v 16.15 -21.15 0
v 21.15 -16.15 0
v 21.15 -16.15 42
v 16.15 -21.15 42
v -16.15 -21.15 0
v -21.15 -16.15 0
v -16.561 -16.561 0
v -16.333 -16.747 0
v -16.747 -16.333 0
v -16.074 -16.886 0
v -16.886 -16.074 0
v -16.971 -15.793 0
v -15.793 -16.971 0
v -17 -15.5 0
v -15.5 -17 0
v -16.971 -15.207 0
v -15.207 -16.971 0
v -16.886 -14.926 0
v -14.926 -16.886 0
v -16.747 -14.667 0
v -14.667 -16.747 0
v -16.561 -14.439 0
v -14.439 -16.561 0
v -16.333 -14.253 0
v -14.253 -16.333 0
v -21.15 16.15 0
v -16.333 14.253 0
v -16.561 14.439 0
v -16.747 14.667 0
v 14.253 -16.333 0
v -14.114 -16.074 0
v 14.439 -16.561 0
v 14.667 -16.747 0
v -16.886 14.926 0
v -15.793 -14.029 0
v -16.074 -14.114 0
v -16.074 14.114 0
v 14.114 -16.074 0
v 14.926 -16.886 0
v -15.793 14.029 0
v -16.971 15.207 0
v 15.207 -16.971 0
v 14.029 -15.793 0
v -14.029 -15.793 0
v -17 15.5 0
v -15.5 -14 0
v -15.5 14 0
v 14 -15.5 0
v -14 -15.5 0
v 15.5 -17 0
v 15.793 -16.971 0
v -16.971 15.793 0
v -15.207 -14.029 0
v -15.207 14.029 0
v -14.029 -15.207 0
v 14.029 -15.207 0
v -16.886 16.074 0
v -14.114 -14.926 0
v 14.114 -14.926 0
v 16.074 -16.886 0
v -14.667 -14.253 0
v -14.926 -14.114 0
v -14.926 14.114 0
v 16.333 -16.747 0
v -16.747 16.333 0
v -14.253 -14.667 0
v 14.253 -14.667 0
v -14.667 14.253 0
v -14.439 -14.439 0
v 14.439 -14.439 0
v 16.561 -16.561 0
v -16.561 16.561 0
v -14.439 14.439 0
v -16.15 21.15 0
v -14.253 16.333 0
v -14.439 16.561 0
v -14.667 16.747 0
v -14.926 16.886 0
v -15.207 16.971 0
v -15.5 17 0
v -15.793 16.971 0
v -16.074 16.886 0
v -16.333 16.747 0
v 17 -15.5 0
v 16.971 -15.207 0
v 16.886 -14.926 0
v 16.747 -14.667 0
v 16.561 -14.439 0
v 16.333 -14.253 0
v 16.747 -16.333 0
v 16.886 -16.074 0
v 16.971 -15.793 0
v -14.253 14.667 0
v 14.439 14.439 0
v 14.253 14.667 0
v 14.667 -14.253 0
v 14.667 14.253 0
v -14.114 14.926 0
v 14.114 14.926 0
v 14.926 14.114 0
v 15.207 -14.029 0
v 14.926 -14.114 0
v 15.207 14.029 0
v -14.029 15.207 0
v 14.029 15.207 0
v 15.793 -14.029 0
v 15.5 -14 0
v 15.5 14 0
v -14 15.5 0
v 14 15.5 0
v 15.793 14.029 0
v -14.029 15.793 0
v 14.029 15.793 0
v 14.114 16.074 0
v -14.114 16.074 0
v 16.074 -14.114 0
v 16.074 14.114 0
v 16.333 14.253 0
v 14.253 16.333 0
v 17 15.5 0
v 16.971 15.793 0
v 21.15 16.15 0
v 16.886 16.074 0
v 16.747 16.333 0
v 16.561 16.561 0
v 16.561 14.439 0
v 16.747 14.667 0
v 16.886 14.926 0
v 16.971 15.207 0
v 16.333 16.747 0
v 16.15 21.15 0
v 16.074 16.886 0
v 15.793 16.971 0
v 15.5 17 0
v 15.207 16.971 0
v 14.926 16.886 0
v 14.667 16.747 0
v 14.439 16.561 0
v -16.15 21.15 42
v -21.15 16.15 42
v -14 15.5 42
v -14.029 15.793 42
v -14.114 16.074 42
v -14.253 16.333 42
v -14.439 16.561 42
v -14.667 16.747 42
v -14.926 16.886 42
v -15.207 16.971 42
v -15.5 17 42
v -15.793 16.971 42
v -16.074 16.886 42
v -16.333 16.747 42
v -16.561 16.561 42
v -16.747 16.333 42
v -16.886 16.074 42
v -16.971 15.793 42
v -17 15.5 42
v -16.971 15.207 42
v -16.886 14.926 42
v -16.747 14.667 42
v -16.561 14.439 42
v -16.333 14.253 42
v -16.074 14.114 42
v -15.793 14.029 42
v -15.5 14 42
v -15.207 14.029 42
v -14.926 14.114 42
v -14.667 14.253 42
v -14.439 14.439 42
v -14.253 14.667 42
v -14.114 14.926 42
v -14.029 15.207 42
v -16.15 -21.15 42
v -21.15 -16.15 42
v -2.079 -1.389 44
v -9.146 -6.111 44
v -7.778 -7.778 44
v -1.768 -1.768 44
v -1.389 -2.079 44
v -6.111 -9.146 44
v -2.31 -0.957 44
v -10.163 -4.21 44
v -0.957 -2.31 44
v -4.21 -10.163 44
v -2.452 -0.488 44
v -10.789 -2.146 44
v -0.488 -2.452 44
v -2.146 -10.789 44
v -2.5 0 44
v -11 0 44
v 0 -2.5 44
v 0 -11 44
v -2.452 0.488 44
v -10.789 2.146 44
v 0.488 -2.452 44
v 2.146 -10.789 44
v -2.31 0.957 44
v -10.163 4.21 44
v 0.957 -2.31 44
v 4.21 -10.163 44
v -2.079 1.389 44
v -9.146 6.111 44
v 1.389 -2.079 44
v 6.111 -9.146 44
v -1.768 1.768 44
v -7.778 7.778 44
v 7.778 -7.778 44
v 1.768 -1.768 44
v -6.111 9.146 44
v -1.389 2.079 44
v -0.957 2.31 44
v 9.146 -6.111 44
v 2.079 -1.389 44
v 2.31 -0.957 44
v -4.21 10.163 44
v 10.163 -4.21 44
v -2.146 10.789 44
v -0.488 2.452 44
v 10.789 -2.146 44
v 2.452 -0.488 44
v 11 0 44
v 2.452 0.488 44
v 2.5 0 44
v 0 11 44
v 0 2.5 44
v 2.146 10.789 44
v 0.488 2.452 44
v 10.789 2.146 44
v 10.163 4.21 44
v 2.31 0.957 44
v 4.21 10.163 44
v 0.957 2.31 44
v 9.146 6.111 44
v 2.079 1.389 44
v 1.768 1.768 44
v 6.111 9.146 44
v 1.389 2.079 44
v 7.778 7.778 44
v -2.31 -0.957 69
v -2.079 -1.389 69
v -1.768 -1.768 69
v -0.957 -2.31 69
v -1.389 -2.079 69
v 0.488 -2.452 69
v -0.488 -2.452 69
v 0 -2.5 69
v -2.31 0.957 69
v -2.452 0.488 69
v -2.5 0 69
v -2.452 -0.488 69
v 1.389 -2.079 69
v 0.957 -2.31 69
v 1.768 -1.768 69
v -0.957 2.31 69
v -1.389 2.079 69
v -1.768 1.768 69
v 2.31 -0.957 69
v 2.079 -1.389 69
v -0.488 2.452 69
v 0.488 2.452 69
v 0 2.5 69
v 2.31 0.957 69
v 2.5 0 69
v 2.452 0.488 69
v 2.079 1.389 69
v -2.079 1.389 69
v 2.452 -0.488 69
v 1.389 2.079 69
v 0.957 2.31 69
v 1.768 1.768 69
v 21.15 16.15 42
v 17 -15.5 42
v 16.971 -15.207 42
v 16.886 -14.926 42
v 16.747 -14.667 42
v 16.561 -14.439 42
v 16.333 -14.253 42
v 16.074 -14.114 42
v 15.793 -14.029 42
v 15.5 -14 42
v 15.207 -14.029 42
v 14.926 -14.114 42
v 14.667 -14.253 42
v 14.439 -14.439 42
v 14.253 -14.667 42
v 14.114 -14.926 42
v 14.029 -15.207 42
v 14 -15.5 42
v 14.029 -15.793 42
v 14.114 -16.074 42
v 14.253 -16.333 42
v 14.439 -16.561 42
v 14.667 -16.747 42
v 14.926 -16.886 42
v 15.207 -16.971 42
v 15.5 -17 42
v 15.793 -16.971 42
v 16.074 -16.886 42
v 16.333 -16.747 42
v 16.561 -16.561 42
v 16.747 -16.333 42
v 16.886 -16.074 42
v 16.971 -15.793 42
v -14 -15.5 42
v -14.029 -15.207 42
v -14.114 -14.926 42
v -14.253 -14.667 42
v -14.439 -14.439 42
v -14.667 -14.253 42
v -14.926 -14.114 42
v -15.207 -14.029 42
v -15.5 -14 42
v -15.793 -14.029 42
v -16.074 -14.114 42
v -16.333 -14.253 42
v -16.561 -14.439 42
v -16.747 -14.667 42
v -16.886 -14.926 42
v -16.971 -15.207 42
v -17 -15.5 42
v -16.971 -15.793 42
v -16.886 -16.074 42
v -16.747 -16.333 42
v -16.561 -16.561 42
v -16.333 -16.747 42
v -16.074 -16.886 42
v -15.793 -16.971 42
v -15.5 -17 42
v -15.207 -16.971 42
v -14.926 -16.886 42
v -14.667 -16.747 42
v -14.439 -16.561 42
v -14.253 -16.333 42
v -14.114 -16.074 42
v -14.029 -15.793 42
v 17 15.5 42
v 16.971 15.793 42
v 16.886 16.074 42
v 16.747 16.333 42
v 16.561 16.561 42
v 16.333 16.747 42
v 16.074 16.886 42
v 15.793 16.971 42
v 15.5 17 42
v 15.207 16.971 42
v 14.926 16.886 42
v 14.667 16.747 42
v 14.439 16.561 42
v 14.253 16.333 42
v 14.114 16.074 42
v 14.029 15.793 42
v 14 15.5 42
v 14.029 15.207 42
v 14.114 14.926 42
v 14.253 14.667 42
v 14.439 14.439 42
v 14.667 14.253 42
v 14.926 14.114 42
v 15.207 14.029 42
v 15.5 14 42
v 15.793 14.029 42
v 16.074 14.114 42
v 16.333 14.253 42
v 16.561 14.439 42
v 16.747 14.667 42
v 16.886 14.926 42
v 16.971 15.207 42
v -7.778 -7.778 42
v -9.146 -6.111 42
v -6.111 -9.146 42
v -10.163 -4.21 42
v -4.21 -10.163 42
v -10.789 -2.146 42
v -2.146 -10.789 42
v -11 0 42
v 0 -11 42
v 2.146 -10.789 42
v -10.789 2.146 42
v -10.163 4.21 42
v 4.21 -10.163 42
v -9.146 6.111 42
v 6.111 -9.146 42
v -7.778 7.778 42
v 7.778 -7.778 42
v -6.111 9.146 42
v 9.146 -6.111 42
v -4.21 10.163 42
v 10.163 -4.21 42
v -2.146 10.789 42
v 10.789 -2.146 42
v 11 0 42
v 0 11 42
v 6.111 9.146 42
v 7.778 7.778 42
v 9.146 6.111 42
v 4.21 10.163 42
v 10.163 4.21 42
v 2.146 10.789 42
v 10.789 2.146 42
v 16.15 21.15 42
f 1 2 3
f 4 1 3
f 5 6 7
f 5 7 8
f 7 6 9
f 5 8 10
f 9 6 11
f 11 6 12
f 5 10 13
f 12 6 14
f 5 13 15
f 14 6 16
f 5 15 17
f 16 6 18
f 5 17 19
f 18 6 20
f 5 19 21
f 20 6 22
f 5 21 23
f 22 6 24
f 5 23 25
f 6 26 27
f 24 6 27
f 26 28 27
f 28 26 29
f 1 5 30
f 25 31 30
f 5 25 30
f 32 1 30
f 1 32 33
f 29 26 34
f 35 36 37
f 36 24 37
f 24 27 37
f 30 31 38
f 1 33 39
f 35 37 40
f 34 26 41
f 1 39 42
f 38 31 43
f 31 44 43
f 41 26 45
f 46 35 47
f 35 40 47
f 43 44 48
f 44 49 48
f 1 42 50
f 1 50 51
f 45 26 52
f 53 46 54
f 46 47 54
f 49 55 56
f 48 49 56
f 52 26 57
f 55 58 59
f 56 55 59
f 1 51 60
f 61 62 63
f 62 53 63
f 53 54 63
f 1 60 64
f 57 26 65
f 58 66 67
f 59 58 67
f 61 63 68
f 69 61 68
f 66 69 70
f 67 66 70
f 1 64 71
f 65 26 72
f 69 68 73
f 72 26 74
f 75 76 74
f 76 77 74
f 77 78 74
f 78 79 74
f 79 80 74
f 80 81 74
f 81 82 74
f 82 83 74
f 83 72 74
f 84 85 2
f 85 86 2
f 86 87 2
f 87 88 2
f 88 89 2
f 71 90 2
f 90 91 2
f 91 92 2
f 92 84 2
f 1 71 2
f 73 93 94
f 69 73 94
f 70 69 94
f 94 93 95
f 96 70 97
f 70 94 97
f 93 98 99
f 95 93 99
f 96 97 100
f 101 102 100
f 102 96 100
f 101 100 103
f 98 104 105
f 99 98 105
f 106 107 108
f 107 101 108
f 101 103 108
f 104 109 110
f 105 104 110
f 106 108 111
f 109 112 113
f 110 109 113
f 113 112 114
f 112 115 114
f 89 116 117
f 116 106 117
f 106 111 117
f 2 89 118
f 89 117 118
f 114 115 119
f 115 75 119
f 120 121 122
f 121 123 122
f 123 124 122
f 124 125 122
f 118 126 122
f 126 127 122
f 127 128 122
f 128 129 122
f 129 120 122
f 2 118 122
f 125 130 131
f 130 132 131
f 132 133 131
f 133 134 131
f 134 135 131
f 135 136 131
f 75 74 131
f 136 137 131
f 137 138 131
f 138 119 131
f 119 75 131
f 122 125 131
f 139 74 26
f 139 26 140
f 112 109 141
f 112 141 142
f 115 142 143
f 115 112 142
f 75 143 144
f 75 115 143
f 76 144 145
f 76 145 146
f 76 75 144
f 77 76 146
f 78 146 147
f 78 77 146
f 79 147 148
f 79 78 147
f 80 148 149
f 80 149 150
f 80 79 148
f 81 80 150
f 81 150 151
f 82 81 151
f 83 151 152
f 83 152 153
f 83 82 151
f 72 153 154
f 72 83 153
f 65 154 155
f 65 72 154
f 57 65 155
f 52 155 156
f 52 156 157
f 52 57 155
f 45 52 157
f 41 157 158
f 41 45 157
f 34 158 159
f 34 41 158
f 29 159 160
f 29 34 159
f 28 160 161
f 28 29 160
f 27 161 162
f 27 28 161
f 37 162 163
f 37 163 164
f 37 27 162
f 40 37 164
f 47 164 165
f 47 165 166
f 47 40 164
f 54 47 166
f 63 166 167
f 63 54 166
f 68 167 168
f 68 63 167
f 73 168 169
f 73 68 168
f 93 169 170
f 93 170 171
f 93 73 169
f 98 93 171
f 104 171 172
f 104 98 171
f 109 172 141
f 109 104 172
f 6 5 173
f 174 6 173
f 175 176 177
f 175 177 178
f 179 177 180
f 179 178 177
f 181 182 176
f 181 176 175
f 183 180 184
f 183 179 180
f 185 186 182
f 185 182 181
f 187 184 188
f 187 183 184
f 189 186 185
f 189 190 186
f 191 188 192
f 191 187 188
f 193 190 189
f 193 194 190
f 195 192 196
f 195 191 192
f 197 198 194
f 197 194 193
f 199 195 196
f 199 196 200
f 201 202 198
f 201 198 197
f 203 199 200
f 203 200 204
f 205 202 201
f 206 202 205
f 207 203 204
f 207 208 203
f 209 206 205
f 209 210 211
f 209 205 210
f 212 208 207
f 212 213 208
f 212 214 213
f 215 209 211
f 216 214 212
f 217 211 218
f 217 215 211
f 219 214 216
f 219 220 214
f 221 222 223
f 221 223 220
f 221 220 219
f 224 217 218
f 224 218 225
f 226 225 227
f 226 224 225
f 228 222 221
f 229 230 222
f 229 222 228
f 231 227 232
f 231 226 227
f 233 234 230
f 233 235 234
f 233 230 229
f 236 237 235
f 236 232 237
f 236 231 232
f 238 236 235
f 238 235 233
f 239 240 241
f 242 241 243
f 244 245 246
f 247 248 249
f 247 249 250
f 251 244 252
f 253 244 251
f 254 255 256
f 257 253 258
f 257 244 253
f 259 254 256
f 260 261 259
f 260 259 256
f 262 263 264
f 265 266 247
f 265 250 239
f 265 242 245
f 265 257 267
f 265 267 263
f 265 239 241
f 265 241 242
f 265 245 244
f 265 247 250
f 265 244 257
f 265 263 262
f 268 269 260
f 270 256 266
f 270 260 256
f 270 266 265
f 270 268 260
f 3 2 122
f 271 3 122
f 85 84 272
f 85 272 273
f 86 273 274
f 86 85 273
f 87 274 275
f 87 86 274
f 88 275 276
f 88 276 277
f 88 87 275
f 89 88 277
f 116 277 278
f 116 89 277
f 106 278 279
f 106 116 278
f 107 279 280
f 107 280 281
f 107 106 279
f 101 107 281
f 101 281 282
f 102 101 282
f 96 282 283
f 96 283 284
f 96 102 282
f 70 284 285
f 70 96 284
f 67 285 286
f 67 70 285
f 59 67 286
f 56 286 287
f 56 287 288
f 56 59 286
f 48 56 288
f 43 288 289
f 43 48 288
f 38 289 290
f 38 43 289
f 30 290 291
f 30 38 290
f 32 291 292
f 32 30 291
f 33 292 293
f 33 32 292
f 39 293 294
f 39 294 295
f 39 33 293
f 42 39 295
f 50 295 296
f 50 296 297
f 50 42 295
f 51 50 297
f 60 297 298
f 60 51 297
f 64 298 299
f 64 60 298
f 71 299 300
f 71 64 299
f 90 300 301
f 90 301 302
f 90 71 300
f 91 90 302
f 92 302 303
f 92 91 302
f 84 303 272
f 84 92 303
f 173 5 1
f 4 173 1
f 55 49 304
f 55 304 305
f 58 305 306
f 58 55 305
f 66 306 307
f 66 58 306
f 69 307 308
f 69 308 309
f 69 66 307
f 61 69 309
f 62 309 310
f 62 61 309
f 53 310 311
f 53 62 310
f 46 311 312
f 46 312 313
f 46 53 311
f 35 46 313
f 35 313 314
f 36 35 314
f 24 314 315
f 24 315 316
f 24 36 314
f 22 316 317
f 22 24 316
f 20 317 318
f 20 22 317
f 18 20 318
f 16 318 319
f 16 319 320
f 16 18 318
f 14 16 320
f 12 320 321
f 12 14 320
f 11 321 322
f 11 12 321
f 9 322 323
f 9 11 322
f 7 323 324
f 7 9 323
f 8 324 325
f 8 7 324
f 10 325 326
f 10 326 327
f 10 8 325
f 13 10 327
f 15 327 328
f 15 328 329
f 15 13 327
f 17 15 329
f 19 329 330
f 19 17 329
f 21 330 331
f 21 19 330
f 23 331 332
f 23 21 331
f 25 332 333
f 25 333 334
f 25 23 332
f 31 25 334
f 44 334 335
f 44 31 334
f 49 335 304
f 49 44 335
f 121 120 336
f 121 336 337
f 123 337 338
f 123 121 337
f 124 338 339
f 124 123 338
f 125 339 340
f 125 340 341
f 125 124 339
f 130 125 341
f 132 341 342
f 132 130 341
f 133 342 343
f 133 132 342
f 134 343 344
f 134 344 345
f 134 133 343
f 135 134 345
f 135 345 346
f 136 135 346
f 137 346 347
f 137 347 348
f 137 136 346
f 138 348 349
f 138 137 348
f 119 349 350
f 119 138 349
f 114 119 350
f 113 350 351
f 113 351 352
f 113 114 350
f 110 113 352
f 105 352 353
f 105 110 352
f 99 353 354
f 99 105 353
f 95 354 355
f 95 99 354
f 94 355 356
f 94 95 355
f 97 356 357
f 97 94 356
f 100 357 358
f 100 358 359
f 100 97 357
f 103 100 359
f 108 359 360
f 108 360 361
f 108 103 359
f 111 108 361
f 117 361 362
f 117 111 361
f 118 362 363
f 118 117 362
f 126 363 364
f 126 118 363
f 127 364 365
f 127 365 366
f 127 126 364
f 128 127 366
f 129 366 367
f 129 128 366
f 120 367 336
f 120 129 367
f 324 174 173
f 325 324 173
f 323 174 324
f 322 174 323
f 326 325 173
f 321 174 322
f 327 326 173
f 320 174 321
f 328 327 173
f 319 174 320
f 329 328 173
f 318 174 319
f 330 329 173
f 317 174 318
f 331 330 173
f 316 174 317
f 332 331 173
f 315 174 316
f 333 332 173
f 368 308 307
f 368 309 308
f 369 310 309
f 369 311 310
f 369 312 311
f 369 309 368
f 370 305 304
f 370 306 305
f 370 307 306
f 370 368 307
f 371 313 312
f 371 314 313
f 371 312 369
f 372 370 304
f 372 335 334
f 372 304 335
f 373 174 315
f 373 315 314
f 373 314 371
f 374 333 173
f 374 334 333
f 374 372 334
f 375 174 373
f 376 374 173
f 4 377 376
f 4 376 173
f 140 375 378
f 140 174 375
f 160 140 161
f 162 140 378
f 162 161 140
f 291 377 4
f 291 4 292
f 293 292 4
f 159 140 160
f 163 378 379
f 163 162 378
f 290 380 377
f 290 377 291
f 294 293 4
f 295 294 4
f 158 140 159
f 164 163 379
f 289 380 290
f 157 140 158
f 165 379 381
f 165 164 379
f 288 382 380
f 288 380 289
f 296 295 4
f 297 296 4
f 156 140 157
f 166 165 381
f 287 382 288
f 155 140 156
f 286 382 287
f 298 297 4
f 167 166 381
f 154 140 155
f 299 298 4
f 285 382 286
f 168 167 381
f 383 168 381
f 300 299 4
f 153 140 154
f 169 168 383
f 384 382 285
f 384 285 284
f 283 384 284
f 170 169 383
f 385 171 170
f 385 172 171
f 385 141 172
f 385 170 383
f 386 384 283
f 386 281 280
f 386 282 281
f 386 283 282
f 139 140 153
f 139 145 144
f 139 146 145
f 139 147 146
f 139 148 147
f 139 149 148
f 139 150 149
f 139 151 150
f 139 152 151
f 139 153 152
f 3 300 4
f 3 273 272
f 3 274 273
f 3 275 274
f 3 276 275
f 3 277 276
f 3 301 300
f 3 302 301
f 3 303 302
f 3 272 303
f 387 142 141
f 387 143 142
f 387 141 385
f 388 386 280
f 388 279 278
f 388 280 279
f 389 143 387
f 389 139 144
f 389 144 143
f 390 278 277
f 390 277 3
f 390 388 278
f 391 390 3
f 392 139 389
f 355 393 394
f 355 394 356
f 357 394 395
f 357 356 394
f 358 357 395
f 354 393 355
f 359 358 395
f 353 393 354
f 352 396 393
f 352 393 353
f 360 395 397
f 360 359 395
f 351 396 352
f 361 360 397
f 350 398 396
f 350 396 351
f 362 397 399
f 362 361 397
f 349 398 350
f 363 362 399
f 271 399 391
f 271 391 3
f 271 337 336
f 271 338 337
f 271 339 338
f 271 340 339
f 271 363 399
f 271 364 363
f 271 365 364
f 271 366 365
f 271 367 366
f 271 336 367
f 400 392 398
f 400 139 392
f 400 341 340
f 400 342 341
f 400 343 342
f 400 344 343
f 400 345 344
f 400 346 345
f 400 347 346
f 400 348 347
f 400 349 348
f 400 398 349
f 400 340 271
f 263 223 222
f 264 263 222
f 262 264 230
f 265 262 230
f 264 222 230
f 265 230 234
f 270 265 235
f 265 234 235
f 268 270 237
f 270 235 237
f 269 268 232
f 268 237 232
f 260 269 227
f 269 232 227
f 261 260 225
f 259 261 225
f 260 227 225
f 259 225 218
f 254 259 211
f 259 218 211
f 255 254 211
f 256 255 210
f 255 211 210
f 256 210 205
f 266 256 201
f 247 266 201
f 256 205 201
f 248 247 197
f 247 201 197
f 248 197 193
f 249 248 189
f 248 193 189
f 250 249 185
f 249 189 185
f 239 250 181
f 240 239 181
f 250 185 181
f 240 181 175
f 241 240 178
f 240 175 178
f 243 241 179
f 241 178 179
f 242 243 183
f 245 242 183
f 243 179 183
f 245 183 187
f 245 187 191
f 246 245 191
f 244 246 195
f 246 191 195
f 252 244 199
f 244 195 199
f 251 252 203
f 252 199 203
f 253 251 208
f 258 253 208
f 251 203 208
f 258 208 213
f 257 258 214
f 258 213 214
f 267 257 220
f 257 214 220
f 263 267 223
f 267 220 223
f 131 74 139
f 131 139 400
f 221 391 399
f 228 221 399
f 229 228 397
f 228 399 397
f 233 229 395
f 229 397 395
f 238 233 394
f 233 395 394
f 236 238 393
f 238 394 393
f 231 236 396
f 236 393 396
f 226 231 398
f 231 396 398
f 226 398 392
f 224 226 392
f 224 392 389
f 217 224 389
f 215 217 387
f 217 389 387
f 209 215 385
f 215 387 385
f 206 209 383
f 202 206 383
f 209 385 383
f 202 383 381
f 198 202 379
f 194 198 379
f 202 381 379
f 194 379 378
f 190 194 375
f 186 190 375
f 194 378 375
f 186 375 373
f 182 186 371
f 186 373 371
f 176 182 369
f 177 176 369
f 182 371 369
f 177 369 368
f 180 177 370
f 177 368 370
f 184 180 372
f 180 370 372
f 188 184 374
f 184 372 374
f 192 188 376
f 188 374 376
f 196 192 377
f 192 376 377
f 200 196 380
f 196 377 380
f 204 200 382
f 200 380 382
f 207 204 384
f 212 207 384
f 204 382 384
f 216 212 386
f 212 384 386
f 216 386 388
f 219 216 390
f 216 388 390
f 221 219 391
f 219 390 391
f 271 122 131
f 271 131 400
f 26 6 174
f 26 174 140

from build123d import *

# Parameters (mm, degrees)
F0_W     = 42.3
F0_H     = 42.3
F0_R     = 1.5
F1_DEPTH = 42
F2_R     = 11
F3_DEPTH = 2
F4_R     = 2.5
F5_DEPTH = 25
F6_SIZE  = 5


with BuildPart() as f1:
    # F0 (on Top) → F1 (new body)
    with BuildSketch(Plane.XY):
        Rectangle(F0_W, F0_H)
        with Locations((-15.5, -15.5)):
            Circle(F0_R, mode=Mode.SUBTRACT)
        with Locations((15.5, -15.5)):
            Circle(F0_R, mode=Mode.SUBTRACT)
        with Locations((-15.5, 15.5)):
            Circle(F0_R, mode=Mode.SUBTRACT)
        with Locations((15.5, 15.5)):
            Circle(F0_R, mode=Mode.SUBTRACT)
    extrude(amount=F1_DEPTH)

    # F2 (on face) → F3 (join)
    with BuildSketch(Plane.XY.offset(42)):
        Circle(F2_R)
    extrude(amount=F3_DEPTH)

    # F4 (on face) → F5 (join)
    with BuildSketch(Plane.XY.offset(44)):
        Circle(F4_R)
    extrude(amount=F5_DEPTH)

    # F6
    f6_edges = [f1.edges().sort_by_distance(p)[0] for p in [
        (-21.15, -21.15, 21),
        (21.15, -21.15, 21),
        (21.15, 21.15, 21),
        (-21.15, 21.15, 21),
    ]]
    chamfer(f6_edges, length=F6_SIZE)


solid = f1.part
